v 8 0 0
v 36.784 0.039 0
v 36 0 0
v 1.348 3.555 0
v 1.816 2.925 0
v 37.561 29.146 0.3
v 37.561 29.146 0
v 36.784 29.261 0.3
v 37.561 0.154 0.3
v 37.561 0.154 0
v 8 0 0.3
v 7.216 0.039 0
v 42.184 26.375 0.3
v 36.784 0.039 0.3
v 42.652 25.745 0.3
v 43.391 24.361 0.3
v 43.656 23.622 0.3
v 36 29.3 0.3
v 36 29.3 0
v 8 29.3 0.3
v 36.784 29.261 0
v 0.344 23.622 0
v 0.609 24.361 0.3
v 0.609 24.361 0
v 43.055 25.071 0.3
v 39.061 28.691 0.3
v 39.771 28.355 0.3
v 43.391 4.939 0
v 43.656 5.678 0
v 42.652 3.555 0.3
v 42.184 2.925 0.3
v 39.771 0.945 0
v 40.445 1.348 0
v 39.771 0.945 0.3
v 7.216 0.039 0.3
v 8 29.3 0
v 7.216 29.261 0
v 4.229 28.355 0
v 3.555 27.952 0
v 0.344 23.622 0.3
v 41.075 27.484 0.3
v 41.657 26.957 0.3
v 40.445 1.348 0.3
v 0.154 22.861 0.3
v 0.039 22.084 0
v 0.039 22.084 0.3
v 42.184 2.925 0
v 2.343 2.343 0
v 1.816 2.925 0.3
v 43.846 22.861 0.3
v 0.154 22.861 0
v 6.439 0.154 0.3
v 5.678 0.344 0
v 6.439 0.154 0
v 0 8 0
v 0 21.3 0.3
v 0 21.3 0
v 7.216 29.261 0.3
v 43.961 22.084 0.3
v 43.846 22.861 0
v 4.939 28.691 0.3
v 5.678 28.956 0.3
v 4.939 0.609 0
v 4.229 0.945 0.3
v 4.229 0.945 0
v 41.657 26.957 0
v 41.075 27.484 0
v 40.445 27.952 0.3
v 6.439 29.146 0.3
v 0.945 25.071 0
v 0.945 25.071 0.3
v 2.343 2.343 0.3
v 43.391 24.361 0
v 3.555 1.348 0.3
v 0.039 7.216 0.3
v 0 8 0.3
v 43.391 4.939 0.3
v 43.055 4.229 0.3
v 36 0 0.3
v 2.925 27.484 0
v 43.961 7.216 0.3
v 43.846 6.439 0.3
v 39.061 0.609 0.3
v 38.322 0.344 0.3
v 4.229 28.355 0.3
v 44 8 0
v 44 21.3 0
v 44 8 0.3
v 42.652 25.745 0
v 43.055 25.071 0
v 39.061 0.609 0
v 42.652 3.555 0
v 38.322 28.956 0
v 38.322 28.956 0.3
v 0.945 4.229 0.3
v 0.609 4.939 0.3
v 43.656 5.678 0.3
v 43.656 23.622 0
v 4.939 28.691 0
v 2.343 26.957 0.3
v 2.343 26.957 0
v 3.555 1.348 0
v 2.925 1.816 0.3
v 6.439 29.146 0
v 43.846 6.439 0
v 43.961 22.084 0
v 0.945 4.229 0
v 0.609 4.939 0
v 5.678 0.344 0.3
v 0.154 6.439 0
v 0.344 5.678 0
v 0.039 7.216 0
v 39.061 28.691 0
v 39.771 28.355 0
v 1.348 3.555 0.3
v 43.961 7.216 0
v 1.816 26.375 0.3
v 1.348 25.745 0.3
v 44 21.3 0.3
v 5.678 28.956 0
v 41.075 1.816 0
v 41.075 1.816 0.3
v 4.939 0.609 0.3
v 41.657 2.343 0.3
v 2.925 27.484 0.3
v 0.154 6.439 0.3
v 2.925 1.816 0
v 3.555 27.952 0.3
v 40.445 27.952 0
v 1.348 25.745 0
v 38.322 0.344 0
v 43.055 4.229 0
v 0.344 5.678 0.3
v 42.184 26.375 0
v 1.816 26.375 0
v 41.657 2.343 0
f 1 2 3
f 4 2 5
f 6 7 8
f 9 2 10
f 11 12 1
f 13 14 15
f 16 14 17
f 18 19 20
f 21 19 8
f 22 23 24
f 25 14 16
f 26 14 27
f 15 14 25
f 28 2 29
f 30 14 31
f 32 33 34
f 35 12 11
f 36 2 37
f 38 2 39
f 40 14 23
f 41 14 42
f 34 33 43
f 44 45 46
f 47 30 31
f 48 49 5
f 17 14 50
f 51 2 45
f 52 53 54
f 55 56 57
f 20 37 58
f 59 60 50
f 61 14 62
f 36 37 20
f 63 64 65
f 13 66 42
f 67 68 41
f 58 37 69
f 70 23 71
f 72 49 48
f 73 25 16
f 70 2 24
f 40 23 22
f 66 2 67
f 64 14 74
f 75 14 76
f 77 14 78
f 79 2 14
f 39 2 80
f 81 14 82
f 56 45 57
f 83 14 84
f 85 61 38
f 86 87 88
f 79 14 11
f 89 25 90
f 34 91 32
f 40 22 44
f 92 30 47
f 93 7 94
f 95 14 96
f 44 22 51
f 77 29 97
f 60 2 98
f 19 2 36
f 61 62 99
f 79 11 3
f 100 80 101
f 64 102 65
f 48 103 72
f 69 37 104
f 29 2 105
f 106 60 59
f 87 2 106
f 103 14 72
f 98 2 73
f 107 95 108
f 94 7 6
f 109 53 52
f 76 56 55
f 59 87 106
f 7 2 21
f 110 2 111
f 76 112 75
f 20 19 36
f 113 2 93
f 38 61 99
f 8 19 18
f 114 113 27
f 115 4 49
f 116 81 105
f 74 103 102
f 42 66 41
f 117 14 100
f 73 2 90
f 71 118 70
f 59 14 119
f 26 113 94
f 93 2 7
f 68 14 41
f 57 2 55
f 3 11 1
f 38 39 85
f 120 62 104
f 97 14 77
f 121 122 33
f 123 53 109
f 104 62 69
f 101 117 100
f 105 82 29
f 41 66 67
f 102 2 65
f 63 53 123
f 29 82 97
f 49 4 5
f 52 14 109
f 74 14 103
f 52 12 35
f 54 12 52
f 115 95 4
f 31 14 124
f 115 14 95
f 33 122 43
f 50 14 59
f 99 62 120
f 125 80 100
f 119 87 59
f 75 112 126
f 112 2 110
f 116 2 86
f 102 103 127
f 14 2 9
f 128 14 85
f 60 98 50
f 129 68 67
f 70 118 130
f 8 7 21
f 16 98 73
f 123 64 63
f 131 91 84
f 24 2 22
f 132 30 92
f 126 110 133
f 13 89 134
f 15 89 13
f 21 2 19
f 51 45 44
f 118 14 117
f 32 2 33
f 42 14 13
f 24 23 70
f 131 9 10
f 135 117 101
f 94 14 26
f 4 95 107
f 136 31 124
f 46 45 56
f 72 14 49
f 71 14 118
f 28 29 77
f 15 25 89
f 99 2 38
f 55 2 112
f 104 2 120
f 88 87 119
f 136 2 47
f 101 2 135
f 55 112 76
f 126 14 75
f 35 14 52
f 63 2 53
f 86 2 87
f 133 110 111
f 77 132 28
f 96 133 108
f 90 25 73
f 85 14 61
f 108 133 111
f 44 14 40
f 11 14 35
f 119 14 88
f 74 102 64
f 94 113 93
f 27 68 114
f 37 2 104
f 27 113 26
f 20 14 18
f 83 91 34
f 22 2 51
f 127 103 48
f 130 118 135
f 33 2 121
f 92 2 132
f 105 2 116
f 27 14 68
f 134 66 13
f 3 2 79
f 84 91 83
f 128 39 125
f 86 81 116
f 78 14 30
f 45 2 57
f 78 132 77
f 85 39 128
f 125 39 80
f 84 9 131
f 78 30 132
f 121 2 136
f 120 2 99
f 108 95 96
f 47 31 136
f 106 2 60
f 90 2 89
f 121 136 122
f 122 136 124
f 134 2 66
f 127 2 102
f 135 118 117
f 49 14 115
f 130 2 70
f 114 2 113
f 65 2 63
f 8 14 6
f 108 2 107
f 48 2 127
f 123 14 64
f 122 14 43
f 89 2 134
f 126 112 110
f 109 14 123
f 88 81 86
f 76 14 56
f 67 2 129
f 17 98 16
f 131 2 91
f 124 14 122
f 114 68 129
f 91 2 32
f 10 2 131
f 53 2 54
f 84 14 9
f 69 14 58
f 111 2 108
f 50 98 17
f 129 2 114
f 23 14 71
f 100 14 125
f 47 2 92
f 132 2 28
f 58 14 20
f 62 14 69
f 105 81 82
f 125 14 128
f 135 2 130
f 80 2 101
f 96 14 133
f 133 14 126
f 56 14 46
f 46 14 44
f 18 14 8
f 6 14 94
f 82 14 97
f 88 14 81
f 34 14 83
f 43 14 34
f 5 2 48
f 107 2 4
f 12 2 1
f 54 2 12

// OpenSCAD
$fn=64;
radius=8;
height=0.3;
translate([radius,radius,0]) minkowski()
{
  cube([44-2*radius,29.3-2*radius,height/2]);
  cylinder(r=radius,h=height/2);
}
